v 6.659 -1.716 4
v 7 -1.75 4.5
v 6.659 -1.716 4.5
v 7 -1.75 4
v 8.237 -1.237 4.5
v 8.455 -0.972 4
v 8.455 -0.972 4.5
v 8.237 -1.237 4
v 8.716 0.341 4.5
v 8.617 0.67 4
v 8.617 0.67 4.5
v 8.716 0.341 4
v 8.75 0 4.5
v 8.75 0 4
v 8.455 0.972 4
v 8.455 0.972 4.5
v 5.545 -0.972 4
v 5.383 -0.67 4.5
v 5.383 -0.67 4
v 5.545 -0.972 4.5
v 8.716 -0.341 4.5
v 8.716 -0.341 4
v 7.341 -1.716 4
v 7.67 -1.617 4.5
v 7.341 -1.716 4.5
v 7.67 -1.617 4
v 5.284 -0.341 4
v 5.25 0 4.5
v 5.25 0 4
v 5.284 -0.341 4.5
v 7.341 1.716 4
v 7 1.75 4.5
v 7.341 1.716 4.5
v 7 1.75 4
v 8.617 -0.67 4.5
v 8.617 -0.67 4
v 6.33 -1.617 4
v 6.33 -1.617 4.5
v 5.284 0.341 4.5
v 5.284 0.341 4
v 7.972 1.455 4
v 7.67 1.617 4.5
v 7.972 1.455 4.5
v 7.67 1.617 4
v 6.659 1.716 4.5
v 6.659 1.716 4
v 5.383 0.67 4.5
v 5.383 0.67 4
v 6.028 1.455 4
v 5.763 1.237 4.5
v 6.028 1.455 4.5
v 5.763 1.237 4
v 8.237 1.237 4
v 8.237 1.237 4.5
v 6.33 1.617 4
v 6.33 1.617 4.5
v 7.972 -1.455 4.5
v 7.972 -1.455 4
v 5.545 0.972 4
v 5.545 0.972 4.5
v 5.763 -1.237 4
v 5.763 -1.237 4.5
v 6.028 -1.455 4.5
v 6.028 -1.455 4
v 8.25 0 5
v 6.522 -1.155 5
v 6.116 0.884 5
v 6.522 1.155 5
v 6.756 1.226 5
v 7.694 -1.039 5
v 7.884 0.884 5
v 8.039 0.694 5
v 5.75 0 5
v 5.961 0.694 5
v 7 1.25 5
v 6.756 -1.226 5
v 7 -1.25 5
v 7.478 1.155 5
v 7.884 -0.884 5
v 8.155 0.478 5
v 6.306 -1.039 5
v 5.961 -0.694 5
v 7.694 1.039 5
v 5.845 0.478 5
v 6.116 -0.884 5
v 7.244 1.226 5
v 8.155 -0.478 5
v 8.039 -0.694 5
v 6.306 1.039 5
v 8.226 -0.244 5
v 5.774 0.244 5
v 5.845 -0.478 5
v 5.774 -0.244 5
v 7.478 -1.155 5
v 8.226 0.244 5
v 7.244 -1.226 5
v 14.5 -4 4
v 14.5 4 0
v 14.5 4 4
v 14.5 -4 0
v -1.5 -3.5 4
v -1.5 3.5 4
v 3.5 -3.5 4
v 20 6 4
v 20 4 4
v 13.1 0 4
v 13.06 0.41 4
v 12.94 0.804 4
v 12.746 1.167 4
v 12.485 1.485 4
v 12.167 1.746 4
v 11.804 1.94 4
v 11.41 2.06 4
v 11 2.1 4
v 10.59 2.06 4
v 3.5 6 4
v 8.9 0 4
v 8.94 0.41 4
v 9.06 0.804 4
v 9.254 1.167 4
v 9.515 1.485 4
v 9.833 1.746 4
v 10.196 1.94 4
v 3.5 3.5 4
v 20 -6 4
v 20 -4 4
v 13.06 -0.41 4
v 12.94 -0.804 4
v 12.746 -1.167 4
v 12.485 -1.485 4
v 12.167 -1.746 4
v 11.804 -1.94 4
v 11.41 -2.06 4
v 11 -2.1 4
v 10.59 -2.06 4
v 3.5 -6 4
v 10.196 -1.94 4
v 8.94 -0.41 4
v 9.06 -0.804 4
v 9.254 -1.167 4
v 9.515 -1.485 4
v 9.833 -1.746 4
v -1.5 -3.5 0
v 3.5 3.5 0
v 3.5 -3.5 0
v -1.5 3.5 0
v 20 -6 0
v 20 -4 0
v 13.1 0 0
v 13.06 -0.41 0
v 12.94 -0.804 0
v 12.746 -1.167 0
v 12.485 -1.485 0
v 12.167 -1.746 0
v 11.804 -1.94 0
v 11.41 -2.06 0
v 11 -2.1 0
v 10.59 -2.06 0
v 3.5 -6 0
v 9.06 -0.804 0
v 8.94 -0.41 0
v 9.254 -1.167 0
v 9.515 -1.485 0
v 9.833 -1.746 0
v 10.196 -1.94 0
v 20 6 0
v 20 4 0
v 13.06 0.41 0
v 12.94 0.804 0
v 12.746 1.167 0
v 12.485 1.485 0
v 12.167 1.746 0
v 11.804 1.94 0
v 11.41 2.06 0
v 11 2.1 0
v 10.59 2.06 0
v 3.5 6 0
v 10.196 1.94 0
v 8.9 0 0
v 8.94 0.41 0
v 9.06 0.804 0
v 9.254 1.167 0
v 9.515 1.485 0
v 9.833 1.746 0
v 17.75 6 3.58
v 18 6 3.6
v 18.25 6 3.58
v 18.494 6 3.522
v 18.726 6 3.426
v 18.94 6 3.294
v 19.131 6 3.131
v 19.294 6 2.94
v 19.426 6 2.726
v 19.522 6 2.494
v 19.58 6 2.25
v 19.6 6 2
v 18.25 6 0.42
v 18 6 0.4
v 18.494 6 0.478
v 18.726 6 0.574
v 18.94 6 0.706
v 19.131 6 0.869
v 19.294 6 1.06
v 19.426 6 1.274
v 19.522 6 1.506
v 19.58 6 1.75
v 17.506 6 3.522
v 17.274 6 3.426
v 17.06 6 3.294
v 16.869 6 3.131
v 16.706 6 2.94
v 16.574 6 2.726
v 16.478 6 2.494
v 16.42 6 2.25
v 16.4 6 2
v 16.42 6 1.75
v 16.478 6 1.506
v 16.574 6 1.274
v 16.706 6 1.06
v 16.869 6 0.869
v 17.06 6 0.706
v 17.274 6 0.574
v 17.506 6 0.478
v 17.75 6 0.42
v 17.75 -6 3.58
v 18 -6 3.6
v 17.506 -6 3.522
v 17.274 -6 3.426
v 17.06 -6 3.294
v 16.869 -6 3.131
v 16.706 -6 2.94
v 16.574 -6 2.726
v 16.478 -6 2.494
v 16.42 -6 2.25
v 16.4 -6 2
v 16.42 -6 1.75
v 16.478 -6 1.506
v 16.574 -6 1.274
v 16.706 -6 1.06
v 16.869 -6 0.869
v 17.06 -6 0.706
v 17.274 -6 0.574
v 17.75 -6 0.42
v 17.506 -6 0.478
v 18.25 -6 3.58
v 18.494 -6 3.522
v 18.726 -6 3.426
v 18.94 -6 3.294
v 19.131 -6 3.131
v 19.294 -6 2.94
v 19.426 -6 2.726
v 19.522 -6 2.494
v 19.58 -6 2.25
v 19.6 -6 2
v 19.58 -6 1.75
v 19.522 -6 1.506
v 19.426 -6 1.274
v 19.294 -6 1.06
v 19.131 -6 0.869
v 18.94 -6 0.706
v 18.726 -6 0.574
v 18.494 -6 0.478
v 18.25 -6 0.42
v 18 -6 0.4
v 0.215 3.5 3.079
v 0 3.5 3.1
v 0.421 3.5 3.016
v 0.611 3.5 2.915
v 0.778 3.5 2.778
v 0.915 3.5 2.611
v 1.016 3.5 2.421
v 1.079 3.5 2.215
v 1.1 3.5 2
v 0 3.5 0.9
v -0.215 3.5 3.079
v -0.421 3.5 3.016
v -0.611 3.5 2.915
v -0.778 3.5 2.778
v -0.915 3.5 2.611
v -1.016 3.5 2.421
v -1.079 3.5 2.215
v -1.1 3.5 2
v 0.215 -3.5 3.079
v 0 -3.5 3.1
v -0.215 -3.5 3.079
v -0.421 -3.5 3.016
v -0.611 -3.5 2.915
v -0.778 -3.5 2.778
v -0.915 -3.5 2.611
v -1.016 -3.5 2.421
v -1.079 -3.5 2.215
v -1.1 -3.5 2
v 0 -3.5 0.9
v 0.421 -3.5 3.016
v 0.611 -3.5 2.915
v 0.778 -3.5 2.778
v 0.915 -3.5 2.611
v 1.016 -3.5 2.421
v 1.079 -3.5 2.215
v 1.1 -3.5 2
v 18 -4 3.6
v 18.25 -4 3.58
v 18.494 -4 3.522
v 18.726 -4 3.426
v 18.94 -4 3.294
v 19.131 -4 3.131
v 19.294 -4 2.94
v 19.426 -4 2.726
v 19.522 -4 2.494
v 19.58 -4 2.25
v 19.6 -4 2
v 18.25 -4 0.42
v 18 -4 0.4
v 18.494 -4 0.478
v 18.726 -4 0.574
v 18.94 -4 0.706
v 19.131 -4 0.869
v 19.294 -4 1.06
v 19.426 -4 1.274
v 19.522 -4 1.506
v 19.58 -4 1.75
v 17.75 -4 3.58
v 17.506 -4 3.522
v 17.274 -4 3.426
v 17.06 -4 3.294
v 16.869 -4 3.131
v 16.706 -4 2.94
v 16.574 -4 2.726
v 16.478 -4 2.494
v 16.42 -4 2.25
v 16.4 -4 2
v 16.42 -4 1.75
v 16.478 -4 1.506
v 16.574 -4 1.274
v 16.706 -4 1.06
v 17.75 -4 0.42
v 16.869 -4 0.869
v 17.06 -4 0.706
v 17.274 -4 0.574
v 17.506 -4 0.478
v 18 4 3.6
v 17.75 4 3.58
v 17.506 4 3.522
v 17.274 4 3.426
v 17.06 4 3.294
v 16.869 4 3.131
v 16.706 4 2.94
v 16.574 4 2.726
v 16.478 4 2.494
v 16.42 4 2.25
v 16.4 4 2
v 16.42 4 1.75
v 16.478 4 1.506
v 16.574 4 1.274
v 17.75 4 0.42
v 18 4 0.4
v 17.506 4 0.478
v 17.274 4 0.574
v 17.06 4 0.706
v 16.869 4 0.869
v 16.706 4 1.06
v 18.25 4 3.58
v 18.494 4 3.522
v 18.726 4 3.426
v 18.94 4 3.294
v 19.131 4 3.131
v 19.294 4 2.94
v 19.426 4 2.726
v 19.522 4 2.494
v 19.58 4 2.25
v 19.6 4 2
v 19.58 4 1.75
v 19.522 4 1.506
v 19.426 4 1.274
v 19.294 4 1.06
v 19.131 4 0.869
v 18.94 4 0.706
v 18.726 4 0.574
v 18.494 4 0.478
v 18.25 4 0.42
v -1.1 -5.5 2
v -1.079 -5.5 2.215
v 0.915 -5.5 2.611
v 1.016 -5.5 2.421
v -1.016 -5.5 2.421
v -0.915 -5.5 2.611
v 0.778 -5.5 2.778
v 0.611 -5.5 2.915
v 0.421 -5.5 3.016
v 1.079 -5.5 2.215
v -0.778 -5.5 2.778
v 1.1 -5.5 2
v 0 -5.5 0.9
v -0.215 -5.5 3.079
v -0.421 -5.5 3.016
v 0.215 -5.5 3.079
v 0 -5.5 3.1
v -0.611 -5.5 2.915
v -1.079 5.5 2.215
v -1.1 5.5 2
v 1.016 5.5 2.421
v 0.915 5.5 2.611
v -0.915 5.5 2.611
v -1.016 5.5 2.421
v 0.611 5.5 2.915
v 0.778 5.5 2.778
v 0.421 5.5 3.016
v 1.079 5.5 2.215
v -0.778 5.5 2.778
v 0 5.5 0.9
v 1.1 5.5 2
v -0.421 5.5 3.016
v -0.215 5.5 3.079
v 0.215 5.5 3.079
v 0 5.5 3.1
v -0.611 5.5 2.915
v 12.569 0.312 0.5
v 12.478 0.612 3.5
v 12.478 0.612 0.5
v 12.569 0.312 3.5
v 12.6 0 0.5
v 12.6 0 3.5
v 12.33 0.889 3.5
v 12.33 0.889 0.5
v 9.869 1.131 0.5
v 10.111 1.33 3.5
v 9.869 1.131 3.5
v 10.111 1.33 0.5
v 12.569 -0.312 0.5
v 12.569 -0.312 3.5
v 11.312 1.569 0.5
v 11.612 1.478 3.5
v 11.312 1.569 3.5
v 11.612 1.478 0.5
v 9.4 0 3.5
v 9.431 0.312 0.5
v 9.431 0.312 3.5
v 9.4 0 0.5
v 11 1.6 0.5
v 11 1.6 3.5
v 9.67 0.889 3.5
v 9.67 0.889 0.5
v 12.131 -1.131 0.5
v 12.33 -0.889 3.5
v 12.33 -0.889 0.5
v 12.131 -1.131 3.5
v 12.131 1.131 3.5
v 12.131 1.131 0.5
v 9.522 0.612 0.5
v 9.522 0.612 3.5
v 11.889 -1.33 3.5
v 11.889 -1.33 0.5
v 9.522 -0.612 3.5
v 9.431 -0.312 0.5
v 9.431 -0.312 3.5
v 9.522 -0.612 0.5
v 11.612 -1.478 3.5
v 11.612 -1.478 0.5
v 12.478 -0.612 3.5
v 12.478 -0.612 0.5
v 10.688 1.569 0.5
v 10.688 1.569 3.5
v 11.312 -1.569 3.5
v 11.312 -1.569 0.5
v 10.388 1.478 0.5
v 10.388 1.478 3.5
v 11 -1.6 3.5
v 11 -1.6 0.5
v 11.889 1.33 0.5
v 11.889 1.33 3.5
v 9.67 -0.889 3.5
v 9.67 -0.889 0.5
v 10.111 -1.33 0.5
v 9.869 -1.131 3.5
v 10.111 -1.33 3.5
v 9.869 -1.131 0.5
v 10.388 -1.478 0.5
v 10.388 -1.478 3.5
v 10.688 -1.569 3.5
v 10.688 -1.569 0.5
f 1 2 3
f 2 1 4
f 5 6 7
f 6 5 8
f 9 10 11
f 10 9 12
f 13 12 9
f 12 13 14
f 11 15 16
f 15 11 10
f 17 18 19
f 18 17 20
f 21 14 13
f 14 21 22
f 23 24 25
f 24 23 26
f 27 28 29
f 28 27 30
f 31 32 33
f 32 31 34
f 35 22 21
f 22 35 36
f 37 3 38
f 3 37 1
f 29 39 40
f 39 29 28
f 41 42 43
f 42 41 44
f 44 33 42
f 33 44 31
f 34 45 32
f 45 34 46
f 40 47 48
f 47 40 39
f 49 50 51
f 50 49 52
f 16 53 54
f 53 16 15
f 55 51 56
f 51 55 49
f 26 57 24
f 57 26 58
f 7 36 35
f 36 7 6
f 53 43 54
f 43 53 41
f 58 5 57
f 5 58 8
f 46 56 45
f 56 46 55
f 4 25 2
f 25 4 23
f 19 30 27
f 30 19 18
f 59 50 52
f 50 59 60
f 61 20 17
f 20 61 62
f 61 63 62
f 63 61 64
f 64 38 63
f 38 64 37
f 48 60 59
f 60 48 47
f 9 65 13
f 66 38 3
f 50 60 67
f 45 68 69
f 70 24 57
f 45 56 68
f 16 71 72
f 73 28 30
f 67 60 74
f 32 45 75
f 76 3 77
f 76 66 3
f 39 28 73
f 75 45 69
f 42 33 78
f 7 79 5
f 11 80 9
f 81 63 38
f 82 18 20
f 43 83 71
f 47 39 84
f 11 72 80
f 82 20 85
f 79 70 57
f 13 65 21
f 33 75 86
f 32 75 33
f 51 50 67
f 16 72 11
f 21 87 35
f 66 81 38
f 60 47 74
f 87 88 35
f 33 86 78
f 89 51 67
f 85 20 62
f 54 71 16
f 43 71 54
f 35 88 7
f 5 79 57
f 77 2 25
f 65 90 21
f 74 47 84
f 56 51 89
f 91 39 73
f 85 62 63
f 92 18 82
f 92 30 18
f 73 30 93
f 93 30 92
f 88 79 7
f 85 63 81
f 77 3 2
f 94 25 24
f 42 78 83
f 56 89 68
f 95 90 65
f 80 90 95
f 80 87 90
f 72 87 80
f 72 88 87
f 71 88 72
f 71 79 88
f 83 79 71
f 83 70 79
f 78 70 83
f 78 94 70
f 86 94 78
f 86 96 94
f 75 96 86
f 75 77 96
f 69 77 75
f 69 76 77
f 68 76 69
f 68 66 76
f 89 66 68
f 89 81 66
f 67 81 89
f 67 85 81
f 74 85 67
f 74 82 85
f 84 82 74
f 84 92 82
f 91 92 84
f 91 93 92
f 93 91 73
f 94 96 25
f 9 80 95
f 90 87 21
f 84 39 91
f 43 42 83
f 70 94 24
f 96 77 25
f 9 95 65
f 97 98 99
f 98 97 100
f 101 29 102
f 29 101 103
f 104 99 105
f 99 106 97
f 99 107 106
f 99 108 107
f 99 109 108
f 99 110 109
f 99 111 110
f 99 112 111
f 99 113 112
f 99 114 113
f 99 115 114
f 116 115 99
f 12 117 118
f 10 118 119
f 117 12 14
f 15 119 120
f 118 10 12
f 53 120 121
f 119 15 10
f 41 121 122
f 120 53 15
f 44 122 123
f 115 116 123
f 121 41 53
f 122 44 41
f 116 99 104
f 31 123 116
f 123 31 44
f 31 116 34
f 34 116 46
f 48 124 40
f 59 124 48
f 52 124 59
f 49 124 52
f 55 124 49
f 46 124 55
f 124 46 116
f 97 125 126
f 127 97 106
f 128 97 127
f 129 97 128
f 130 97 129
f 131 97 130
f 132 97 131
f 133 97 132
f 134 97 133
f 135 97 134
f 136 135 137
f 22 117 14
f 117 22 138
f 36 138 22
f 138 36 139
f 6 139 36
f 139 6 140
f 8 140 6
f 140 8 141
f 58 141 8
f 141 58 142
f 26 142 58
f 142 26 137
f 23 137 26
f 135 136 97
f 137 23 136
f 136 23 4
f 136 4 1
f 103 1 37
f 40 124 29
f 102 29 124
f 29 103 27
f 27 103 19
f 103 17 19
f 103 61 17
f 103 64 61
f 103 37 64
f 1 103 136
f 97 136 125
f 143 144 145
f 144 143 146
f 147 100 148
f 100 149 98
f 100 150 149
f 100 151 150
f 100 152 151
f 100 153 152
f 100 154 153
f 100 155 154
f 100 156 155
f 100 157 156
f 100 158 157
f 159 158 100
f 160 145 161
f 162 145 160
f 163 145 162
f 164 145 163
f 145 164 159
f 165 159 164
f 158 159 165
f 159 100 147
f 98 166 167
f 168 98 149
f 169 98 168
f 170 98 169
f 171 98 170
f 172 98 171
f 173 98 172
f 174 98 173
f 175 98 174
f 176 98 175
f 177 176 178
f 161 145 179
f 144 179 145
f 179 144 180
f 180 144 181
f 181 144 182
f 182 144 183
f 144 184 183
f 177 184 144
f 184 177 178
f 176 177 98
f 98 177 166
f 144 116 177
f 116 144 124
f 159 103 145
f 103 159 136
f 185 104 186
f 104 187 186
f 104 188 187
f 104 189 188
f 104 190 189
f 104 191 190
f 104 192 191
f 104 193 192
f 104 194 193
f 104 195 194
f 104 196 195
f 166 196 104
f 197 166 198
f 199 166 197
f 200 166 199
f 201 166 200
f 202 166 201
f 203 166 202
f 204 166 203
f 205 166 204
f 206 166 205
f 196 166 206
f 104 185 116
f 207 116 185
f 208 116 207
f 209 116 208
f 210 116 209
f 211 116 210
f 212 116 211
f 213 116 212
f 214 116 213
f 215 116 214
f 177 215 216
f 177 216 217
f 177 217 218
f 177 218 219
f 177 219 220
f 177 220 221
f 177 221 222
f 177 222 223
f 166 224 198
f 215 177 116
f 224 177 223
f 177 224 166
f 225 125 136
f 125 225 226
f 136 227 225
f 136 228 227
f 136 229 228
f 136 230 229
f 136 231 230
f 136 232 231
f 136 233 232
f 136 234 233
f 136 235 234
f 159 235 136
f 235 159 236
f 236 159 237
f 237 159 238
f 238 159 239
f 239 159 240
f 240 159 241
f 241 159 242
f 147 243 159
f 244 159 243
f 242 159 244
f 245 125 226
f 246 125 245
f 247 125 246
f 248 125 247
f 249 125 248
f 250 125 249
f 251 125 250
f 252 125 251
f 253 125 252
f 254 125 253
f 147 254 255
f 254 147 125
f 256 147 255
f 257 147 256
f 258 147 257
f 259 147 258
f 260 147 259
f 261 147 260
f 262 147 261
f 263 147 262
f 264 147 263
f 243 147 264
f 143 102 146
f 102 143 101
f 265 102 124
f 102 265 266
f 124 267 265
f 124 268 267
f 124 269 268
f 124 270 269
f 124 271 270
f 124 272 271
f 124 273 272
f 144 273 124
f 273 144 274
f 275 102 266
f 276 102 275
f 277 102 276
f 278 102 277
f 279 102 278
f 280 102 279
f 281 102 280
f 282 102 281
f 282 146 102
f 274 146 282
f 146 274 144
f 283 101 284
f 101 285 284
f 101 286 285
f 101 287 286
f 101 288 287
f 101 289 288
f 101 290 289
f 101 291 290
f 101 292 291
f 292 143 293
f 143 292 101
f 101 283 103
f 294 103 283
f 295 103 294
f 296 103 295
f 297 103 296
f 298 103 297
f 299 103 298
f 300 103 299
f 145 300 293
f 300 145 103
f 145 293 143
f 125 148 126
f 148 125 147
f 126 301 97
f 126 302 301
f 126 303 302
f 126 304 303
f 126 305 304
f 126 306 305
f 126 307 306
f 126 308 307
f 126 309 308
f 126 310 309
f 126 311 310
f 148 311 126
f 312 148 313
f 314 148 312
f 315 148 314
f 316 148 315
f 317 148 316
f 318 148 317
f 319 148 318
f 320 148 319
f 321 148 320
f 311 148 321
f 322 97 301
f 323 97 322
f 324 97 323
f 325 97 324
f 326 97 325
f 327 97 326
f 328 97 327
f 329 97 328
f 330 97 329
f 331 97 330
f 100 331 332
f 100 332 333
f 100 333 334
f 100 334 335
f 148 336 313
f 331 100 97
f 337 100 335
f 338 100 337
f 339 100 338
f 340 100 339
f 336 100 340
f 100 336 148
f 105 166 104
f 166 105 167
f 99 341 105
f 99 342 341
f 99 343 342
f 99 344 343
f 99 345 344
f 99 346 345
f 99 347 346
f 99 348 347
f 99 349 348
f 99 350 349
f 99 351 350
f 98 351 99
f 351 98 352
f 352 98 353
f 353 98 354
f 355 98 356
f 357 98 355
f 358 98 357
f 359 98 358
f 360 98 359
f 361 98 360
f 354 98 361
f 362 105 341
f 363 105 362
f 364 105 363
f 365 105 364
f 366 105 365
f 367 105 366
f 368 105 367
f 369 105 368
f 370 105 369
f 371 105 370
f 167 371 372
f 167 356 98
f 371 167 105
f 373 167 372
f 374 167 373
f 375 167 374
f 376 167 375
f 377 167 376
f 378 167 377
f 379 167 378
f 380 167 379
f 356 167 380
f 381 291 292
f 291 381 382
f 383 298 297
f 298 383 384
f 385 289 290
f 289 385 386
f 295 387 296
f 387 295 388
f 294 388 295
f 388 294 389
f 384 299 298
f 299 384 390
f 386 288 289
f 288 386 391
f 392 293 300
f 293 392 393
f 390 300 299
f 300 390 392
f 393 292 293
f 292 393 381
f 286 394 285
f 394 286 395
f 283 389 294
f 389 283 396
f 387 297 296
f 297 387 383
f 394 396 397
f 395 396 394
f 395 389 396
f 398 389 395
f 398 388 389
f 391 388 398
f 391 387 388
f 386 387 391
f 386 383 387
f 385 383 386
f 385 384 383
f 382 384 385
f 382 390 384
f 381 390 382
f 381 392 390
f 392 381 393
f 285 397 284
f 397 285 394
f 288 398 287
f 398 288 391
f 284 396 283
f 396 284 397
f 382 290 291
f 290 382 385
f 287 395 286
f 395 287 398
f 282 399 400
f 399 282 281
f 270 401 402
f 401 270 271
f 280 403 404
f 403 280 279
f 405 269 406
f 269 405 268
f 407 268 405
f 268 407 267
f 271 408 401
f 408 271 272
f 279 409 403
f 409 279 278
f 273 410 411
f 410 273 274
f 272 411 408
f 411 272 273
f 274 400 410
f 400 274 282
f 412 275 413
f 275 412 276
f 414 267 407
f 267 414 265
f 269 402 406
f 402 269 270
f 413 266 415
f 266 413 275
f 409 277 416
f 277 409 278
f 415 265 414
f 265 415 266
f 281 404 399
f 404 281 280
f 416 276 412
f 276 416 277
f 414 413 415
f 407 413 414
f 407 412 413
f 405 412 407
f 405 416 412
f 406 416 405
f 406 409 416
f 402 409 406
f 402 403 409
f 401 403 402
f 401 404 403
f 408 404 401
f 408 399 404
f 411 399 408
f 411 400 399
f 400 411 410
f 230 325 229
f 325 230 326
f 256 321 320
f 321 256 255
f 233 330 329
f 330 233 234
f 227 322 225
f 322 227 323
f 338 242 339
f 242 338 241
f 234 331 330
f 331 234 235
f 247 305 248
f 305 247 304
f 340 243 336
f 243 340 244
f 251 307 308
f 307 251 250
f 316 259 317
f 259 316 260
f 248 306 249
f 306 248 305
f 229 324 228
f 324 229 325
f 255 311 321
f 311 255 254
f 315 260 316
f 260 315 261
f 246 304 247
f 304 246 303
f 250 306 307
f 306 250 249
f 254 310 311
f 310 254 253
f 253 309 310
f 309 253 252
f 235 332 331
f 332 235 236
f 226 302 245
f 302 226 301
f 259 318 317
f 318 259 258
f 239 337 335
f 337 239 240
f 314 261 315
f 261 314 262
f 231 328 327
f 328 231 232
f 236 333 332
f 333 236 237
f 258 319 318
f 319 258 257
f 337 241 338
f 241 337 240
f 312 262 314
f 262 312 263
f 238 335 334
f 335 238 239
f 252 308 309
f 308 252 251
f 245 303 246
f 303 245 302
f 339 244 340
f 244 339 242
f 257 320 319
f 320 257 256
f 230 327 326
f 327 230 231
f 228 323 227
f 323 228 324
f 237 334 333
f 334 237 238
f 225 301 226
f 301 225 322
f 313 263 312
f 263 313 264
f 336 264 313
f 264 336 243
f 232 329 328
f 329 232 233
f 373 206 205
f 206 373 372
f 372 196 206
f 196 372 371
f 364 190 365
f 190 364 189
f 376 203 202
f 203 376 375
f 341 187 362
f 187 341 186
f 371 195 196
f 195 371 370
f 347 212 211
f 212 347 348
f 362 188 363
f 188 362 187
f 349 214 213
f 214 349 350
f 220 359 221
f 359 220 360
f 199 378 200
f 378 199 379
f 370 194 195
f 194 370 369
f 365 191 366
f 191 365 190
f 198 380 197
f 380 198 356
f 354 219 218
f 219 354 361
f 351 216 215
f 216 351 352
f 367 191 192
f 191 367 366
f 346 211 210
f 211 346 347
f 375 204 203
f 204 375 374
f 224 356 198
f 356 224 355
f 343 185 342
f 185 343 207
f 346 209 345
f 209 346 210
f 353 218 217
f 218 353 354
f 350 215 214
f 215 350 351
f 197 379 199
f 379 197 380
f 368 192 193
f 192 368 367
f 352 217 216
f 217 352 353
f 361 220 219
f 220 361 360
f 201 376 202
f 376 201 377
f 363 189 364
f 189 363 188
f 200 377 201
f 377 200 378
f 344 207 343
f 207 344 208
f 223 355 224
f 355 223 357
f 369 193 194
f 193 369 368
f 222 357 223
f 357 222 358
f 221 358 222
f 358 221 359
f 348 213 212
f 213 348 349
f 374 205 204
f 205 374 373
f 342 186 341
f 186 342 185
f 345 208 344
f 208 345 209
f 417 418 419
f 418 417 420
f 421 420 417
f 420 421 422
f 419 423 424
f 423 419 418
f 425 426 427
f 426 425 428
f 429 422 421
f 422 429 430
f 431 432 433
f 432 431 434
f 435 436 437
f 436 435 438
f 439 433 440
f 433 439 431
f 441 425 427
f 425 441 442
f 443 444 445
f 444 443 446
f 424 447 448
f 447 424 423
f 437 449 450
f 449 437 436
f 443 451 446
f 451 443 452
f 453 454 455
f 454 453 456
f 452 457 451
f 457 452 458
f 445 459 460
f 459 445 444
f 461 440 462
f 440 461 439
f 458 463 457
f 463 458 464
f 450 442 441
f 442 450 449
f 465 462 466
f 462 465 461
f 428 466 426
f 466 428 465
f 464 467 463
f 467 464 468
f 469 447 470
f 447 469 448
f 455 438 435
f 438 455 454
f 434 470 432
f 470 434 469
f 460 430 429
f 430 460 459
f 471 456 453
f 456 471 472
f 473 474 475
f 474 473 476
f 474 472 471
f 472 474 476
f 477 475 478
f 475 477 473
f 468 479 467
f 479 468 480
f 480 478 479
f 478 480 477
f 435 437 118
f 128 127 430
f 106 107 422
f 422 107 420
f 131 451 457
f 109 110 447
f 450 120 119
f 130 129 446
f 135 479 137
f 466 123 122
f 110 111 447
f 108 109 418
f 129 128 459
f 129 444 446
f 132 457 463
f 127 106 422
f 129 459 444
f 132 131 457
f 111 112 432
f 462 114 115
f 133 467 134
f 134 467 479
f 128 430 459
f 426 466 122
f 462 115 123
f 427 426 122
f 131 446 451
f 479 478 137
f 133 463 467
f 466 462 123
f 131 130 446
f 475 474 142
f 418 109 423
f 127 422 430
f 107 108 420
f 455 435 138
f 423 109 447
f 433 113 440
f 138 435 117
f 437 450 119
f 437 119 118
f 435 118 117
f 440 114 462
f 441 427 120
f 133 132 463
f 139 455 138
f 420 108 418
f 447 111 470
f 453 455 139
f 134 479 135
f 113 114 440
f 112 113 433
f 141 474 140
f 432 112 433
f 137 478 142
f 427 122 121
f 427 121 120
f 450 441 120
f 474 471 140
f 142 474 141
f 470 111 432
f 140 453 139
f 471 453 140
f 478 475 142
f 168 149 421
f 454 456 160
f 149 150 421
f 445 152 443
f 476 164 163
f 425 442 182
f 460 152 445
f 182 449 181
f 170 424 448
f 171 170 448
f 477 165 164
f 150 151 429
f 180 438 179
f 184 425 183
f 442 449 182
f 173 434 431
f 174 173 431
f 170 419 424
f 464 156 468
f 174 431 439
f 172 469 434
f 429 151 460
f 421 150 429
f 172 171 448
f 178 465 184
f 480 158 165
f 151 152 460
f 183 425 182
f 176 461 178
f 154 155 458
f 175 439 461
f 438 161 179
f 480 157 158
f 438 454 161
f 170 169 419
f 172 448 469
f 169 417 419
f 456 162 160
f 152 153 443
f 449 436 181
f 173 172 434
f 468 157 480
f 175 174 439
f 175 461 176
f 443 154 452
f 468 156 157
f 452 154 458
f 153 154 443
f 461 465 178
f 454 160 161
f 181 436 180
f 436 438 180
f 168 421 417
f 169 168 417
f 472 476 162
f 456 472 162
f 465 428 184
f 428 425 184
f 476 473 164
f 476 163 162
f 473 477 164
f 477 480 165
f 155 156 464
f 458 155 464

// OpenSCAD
// Bracelet of hinged links, printed in place
part = "link";
cadverify_only = "";
module instance(name, part, unit = 1) {
    echo(cadverify_instance = [name, part, unit]);
    if (cadverify_only == "" || cadverify_only == name) children();
}
P = 18; W = 12; Zc = 2.0;
Rp = 1.1; Rh = 1.6;
Ytong = 3.5;
Xrear = -1.5; Xsr = 3.5; Xsf = 14.5; Xlr = 13.5; Xfront = 20;
XpinF = 18;
studX = 7; studR = 1.75;
holeX = 11; holeR = 1.6;
module teardrop2D() {
    pts = concat([for (a=[0:180/16:180]) [Rp*cos(a), Zc+Rp*sin(a)]], [[0, Zc-Rp]]);
    polygon(pts);
}
module pin_stub(len) { linear_extrude(height=len) teardrop2D(); }
module stud_solid() {
    translate([studX, 0, 3.9]) cylinder(r=studR, h=0.6, $fn=32);
    translate([studX, 0, 4.5]) cylinder(r1=studR, r2=1.25, h=0.5, $fn=32);
}
module link() {
    difference() {
        union() {
            translate([Xsr, -6, 0]) cube([Xsf-Xsr, 12, 4]);
            translate([Xrear, -Ytong, 0]) cube([(4.5-Xrear), 7, 4]);
            translate([Xlr, -6, 0]) cube([Xfront-Xlr, 2, 4]);
            translate([Xlr, 4, 0]) cube([Xfront-Xlr, 2, 4]);
            translate([0, -2.5, 0]) rotate([90,0,0]) pin_stub(3.0);
            translate([0, 5.5, 0]) rotate([90,0,0]) pin_stub(3.0);
            stud_solid();
        }
        translate([XpinF, -6.1, Zc]) rotate([-90,0,0]) cylinder(r=Rh, h=2.2, $fn=40);
        translate([XpinF, 3.9, Zc]) rotate([-90,0,0]) cylinder(r=Rh, h=2.2, $fn=40);
        translate([holeX, 0, -0.1]) cylinder(r=holeR, h=4.2, $fn=32);
        translate([holeX, 0, 3.5]) cylinder(r1=holeR, r2=2.1, h=0.5, $fn=32);
        translate([holeX, 0, 0]) cylinder(r1=2.1, r2=holeR, h=0.5, $fn=32);
    }
}
if (part == "assembly") {
    echo(cadverify_spec = [
        ["bounds", [[-1.5, -6, 0], [56, 6, 5]]],
        ["support_faces", [["bed", "-z", 300]]],
        ["allowed_interferences", []],
        ["motions", [["joint_bend", ["link3"], "rotate", [36, 0, 2], [0, 1, 0], [-30, 30]]]],
        ["assembly_order", [[["link1"], [0, 0, 0]], [["link2"], [0, 0, -1]], [["link3"], [0, 0, -1]]]],
        ["print_in_place", 0.5],
        ["overhangs_allowed", [
            ["hole top bridge 3.2mm", [[16.4, 4, 3.0], [19.6, 6, 4]]],
            ["hole top bridge 3.2mm", [[16.4, -6, 3.0], [19.6, -4, 4]]],
            ["hole top bridge 3.2mm", [[34.4, 4, 3.0], [37.6, 6, 4]]],
            ["hole top bridge 3.2mm", [[34.4, -6, 3.0], [37.6, -4, 4]]],
            ["hole top bridge 3.2mm", [[52.4, 4, 3.0], [55.6, 6, 4]]],
            ["hole top bridge 3.2mm", [[52.4, -6, 3.0], [55.6, -4, 4]]]
        ]]
    ]);
    instance("link1", "link", 1) translate([0, 0, 0]) link();
    instance("link2", "link", 1) translate([18, 0, 0]) link();
    instance("link3", "link", 1) translate([36, 0, 0]) link();
} else {
    echo(cadverify_spec = [
        ["bounds", [[-2.6, -6, 0], [20, 6, 5]]],
        ["bodies", 1],
        ["through_holes", 3],
        ["support_faces", [["bed", "-z", 100]]],
        ["overhangs_allowed", [
            ["hole top bridge 3.2mm", [[16.4, 4, 3.0], [19.6, 6, 4]]],
            ["hole top bridge 3.2mm", [[16.4, -6, 3.0], [19.6, -4, 4]]]
        ]],
        ["copies", 3],
        ["details", [
            ["spine", "material", [[5, -5, 0], [9, 5, 4]], 0.9],
            ["slot", "void", [[14.5, -4, 0], [20, 4, 4]], 0.9],
            ["pin_hole", "hole", [18, -8, 2], [0, 1, 0], [[0, 3.2], [2, 3.2]]],
            ["snap_hole", "hole", [11, 0, 6], [0, 0, -1], [[0, 4.2], [0.5, 3.2], [3.5, 3.2], [4, 4.2]]],
            ["floor", "thickness", [9, 3, -1], [0, 0, 1], 4],
            ["snap", "view", [[5, -2, 4], [9, 2, 5]]]
        ]]
    ]);
    link();
}
